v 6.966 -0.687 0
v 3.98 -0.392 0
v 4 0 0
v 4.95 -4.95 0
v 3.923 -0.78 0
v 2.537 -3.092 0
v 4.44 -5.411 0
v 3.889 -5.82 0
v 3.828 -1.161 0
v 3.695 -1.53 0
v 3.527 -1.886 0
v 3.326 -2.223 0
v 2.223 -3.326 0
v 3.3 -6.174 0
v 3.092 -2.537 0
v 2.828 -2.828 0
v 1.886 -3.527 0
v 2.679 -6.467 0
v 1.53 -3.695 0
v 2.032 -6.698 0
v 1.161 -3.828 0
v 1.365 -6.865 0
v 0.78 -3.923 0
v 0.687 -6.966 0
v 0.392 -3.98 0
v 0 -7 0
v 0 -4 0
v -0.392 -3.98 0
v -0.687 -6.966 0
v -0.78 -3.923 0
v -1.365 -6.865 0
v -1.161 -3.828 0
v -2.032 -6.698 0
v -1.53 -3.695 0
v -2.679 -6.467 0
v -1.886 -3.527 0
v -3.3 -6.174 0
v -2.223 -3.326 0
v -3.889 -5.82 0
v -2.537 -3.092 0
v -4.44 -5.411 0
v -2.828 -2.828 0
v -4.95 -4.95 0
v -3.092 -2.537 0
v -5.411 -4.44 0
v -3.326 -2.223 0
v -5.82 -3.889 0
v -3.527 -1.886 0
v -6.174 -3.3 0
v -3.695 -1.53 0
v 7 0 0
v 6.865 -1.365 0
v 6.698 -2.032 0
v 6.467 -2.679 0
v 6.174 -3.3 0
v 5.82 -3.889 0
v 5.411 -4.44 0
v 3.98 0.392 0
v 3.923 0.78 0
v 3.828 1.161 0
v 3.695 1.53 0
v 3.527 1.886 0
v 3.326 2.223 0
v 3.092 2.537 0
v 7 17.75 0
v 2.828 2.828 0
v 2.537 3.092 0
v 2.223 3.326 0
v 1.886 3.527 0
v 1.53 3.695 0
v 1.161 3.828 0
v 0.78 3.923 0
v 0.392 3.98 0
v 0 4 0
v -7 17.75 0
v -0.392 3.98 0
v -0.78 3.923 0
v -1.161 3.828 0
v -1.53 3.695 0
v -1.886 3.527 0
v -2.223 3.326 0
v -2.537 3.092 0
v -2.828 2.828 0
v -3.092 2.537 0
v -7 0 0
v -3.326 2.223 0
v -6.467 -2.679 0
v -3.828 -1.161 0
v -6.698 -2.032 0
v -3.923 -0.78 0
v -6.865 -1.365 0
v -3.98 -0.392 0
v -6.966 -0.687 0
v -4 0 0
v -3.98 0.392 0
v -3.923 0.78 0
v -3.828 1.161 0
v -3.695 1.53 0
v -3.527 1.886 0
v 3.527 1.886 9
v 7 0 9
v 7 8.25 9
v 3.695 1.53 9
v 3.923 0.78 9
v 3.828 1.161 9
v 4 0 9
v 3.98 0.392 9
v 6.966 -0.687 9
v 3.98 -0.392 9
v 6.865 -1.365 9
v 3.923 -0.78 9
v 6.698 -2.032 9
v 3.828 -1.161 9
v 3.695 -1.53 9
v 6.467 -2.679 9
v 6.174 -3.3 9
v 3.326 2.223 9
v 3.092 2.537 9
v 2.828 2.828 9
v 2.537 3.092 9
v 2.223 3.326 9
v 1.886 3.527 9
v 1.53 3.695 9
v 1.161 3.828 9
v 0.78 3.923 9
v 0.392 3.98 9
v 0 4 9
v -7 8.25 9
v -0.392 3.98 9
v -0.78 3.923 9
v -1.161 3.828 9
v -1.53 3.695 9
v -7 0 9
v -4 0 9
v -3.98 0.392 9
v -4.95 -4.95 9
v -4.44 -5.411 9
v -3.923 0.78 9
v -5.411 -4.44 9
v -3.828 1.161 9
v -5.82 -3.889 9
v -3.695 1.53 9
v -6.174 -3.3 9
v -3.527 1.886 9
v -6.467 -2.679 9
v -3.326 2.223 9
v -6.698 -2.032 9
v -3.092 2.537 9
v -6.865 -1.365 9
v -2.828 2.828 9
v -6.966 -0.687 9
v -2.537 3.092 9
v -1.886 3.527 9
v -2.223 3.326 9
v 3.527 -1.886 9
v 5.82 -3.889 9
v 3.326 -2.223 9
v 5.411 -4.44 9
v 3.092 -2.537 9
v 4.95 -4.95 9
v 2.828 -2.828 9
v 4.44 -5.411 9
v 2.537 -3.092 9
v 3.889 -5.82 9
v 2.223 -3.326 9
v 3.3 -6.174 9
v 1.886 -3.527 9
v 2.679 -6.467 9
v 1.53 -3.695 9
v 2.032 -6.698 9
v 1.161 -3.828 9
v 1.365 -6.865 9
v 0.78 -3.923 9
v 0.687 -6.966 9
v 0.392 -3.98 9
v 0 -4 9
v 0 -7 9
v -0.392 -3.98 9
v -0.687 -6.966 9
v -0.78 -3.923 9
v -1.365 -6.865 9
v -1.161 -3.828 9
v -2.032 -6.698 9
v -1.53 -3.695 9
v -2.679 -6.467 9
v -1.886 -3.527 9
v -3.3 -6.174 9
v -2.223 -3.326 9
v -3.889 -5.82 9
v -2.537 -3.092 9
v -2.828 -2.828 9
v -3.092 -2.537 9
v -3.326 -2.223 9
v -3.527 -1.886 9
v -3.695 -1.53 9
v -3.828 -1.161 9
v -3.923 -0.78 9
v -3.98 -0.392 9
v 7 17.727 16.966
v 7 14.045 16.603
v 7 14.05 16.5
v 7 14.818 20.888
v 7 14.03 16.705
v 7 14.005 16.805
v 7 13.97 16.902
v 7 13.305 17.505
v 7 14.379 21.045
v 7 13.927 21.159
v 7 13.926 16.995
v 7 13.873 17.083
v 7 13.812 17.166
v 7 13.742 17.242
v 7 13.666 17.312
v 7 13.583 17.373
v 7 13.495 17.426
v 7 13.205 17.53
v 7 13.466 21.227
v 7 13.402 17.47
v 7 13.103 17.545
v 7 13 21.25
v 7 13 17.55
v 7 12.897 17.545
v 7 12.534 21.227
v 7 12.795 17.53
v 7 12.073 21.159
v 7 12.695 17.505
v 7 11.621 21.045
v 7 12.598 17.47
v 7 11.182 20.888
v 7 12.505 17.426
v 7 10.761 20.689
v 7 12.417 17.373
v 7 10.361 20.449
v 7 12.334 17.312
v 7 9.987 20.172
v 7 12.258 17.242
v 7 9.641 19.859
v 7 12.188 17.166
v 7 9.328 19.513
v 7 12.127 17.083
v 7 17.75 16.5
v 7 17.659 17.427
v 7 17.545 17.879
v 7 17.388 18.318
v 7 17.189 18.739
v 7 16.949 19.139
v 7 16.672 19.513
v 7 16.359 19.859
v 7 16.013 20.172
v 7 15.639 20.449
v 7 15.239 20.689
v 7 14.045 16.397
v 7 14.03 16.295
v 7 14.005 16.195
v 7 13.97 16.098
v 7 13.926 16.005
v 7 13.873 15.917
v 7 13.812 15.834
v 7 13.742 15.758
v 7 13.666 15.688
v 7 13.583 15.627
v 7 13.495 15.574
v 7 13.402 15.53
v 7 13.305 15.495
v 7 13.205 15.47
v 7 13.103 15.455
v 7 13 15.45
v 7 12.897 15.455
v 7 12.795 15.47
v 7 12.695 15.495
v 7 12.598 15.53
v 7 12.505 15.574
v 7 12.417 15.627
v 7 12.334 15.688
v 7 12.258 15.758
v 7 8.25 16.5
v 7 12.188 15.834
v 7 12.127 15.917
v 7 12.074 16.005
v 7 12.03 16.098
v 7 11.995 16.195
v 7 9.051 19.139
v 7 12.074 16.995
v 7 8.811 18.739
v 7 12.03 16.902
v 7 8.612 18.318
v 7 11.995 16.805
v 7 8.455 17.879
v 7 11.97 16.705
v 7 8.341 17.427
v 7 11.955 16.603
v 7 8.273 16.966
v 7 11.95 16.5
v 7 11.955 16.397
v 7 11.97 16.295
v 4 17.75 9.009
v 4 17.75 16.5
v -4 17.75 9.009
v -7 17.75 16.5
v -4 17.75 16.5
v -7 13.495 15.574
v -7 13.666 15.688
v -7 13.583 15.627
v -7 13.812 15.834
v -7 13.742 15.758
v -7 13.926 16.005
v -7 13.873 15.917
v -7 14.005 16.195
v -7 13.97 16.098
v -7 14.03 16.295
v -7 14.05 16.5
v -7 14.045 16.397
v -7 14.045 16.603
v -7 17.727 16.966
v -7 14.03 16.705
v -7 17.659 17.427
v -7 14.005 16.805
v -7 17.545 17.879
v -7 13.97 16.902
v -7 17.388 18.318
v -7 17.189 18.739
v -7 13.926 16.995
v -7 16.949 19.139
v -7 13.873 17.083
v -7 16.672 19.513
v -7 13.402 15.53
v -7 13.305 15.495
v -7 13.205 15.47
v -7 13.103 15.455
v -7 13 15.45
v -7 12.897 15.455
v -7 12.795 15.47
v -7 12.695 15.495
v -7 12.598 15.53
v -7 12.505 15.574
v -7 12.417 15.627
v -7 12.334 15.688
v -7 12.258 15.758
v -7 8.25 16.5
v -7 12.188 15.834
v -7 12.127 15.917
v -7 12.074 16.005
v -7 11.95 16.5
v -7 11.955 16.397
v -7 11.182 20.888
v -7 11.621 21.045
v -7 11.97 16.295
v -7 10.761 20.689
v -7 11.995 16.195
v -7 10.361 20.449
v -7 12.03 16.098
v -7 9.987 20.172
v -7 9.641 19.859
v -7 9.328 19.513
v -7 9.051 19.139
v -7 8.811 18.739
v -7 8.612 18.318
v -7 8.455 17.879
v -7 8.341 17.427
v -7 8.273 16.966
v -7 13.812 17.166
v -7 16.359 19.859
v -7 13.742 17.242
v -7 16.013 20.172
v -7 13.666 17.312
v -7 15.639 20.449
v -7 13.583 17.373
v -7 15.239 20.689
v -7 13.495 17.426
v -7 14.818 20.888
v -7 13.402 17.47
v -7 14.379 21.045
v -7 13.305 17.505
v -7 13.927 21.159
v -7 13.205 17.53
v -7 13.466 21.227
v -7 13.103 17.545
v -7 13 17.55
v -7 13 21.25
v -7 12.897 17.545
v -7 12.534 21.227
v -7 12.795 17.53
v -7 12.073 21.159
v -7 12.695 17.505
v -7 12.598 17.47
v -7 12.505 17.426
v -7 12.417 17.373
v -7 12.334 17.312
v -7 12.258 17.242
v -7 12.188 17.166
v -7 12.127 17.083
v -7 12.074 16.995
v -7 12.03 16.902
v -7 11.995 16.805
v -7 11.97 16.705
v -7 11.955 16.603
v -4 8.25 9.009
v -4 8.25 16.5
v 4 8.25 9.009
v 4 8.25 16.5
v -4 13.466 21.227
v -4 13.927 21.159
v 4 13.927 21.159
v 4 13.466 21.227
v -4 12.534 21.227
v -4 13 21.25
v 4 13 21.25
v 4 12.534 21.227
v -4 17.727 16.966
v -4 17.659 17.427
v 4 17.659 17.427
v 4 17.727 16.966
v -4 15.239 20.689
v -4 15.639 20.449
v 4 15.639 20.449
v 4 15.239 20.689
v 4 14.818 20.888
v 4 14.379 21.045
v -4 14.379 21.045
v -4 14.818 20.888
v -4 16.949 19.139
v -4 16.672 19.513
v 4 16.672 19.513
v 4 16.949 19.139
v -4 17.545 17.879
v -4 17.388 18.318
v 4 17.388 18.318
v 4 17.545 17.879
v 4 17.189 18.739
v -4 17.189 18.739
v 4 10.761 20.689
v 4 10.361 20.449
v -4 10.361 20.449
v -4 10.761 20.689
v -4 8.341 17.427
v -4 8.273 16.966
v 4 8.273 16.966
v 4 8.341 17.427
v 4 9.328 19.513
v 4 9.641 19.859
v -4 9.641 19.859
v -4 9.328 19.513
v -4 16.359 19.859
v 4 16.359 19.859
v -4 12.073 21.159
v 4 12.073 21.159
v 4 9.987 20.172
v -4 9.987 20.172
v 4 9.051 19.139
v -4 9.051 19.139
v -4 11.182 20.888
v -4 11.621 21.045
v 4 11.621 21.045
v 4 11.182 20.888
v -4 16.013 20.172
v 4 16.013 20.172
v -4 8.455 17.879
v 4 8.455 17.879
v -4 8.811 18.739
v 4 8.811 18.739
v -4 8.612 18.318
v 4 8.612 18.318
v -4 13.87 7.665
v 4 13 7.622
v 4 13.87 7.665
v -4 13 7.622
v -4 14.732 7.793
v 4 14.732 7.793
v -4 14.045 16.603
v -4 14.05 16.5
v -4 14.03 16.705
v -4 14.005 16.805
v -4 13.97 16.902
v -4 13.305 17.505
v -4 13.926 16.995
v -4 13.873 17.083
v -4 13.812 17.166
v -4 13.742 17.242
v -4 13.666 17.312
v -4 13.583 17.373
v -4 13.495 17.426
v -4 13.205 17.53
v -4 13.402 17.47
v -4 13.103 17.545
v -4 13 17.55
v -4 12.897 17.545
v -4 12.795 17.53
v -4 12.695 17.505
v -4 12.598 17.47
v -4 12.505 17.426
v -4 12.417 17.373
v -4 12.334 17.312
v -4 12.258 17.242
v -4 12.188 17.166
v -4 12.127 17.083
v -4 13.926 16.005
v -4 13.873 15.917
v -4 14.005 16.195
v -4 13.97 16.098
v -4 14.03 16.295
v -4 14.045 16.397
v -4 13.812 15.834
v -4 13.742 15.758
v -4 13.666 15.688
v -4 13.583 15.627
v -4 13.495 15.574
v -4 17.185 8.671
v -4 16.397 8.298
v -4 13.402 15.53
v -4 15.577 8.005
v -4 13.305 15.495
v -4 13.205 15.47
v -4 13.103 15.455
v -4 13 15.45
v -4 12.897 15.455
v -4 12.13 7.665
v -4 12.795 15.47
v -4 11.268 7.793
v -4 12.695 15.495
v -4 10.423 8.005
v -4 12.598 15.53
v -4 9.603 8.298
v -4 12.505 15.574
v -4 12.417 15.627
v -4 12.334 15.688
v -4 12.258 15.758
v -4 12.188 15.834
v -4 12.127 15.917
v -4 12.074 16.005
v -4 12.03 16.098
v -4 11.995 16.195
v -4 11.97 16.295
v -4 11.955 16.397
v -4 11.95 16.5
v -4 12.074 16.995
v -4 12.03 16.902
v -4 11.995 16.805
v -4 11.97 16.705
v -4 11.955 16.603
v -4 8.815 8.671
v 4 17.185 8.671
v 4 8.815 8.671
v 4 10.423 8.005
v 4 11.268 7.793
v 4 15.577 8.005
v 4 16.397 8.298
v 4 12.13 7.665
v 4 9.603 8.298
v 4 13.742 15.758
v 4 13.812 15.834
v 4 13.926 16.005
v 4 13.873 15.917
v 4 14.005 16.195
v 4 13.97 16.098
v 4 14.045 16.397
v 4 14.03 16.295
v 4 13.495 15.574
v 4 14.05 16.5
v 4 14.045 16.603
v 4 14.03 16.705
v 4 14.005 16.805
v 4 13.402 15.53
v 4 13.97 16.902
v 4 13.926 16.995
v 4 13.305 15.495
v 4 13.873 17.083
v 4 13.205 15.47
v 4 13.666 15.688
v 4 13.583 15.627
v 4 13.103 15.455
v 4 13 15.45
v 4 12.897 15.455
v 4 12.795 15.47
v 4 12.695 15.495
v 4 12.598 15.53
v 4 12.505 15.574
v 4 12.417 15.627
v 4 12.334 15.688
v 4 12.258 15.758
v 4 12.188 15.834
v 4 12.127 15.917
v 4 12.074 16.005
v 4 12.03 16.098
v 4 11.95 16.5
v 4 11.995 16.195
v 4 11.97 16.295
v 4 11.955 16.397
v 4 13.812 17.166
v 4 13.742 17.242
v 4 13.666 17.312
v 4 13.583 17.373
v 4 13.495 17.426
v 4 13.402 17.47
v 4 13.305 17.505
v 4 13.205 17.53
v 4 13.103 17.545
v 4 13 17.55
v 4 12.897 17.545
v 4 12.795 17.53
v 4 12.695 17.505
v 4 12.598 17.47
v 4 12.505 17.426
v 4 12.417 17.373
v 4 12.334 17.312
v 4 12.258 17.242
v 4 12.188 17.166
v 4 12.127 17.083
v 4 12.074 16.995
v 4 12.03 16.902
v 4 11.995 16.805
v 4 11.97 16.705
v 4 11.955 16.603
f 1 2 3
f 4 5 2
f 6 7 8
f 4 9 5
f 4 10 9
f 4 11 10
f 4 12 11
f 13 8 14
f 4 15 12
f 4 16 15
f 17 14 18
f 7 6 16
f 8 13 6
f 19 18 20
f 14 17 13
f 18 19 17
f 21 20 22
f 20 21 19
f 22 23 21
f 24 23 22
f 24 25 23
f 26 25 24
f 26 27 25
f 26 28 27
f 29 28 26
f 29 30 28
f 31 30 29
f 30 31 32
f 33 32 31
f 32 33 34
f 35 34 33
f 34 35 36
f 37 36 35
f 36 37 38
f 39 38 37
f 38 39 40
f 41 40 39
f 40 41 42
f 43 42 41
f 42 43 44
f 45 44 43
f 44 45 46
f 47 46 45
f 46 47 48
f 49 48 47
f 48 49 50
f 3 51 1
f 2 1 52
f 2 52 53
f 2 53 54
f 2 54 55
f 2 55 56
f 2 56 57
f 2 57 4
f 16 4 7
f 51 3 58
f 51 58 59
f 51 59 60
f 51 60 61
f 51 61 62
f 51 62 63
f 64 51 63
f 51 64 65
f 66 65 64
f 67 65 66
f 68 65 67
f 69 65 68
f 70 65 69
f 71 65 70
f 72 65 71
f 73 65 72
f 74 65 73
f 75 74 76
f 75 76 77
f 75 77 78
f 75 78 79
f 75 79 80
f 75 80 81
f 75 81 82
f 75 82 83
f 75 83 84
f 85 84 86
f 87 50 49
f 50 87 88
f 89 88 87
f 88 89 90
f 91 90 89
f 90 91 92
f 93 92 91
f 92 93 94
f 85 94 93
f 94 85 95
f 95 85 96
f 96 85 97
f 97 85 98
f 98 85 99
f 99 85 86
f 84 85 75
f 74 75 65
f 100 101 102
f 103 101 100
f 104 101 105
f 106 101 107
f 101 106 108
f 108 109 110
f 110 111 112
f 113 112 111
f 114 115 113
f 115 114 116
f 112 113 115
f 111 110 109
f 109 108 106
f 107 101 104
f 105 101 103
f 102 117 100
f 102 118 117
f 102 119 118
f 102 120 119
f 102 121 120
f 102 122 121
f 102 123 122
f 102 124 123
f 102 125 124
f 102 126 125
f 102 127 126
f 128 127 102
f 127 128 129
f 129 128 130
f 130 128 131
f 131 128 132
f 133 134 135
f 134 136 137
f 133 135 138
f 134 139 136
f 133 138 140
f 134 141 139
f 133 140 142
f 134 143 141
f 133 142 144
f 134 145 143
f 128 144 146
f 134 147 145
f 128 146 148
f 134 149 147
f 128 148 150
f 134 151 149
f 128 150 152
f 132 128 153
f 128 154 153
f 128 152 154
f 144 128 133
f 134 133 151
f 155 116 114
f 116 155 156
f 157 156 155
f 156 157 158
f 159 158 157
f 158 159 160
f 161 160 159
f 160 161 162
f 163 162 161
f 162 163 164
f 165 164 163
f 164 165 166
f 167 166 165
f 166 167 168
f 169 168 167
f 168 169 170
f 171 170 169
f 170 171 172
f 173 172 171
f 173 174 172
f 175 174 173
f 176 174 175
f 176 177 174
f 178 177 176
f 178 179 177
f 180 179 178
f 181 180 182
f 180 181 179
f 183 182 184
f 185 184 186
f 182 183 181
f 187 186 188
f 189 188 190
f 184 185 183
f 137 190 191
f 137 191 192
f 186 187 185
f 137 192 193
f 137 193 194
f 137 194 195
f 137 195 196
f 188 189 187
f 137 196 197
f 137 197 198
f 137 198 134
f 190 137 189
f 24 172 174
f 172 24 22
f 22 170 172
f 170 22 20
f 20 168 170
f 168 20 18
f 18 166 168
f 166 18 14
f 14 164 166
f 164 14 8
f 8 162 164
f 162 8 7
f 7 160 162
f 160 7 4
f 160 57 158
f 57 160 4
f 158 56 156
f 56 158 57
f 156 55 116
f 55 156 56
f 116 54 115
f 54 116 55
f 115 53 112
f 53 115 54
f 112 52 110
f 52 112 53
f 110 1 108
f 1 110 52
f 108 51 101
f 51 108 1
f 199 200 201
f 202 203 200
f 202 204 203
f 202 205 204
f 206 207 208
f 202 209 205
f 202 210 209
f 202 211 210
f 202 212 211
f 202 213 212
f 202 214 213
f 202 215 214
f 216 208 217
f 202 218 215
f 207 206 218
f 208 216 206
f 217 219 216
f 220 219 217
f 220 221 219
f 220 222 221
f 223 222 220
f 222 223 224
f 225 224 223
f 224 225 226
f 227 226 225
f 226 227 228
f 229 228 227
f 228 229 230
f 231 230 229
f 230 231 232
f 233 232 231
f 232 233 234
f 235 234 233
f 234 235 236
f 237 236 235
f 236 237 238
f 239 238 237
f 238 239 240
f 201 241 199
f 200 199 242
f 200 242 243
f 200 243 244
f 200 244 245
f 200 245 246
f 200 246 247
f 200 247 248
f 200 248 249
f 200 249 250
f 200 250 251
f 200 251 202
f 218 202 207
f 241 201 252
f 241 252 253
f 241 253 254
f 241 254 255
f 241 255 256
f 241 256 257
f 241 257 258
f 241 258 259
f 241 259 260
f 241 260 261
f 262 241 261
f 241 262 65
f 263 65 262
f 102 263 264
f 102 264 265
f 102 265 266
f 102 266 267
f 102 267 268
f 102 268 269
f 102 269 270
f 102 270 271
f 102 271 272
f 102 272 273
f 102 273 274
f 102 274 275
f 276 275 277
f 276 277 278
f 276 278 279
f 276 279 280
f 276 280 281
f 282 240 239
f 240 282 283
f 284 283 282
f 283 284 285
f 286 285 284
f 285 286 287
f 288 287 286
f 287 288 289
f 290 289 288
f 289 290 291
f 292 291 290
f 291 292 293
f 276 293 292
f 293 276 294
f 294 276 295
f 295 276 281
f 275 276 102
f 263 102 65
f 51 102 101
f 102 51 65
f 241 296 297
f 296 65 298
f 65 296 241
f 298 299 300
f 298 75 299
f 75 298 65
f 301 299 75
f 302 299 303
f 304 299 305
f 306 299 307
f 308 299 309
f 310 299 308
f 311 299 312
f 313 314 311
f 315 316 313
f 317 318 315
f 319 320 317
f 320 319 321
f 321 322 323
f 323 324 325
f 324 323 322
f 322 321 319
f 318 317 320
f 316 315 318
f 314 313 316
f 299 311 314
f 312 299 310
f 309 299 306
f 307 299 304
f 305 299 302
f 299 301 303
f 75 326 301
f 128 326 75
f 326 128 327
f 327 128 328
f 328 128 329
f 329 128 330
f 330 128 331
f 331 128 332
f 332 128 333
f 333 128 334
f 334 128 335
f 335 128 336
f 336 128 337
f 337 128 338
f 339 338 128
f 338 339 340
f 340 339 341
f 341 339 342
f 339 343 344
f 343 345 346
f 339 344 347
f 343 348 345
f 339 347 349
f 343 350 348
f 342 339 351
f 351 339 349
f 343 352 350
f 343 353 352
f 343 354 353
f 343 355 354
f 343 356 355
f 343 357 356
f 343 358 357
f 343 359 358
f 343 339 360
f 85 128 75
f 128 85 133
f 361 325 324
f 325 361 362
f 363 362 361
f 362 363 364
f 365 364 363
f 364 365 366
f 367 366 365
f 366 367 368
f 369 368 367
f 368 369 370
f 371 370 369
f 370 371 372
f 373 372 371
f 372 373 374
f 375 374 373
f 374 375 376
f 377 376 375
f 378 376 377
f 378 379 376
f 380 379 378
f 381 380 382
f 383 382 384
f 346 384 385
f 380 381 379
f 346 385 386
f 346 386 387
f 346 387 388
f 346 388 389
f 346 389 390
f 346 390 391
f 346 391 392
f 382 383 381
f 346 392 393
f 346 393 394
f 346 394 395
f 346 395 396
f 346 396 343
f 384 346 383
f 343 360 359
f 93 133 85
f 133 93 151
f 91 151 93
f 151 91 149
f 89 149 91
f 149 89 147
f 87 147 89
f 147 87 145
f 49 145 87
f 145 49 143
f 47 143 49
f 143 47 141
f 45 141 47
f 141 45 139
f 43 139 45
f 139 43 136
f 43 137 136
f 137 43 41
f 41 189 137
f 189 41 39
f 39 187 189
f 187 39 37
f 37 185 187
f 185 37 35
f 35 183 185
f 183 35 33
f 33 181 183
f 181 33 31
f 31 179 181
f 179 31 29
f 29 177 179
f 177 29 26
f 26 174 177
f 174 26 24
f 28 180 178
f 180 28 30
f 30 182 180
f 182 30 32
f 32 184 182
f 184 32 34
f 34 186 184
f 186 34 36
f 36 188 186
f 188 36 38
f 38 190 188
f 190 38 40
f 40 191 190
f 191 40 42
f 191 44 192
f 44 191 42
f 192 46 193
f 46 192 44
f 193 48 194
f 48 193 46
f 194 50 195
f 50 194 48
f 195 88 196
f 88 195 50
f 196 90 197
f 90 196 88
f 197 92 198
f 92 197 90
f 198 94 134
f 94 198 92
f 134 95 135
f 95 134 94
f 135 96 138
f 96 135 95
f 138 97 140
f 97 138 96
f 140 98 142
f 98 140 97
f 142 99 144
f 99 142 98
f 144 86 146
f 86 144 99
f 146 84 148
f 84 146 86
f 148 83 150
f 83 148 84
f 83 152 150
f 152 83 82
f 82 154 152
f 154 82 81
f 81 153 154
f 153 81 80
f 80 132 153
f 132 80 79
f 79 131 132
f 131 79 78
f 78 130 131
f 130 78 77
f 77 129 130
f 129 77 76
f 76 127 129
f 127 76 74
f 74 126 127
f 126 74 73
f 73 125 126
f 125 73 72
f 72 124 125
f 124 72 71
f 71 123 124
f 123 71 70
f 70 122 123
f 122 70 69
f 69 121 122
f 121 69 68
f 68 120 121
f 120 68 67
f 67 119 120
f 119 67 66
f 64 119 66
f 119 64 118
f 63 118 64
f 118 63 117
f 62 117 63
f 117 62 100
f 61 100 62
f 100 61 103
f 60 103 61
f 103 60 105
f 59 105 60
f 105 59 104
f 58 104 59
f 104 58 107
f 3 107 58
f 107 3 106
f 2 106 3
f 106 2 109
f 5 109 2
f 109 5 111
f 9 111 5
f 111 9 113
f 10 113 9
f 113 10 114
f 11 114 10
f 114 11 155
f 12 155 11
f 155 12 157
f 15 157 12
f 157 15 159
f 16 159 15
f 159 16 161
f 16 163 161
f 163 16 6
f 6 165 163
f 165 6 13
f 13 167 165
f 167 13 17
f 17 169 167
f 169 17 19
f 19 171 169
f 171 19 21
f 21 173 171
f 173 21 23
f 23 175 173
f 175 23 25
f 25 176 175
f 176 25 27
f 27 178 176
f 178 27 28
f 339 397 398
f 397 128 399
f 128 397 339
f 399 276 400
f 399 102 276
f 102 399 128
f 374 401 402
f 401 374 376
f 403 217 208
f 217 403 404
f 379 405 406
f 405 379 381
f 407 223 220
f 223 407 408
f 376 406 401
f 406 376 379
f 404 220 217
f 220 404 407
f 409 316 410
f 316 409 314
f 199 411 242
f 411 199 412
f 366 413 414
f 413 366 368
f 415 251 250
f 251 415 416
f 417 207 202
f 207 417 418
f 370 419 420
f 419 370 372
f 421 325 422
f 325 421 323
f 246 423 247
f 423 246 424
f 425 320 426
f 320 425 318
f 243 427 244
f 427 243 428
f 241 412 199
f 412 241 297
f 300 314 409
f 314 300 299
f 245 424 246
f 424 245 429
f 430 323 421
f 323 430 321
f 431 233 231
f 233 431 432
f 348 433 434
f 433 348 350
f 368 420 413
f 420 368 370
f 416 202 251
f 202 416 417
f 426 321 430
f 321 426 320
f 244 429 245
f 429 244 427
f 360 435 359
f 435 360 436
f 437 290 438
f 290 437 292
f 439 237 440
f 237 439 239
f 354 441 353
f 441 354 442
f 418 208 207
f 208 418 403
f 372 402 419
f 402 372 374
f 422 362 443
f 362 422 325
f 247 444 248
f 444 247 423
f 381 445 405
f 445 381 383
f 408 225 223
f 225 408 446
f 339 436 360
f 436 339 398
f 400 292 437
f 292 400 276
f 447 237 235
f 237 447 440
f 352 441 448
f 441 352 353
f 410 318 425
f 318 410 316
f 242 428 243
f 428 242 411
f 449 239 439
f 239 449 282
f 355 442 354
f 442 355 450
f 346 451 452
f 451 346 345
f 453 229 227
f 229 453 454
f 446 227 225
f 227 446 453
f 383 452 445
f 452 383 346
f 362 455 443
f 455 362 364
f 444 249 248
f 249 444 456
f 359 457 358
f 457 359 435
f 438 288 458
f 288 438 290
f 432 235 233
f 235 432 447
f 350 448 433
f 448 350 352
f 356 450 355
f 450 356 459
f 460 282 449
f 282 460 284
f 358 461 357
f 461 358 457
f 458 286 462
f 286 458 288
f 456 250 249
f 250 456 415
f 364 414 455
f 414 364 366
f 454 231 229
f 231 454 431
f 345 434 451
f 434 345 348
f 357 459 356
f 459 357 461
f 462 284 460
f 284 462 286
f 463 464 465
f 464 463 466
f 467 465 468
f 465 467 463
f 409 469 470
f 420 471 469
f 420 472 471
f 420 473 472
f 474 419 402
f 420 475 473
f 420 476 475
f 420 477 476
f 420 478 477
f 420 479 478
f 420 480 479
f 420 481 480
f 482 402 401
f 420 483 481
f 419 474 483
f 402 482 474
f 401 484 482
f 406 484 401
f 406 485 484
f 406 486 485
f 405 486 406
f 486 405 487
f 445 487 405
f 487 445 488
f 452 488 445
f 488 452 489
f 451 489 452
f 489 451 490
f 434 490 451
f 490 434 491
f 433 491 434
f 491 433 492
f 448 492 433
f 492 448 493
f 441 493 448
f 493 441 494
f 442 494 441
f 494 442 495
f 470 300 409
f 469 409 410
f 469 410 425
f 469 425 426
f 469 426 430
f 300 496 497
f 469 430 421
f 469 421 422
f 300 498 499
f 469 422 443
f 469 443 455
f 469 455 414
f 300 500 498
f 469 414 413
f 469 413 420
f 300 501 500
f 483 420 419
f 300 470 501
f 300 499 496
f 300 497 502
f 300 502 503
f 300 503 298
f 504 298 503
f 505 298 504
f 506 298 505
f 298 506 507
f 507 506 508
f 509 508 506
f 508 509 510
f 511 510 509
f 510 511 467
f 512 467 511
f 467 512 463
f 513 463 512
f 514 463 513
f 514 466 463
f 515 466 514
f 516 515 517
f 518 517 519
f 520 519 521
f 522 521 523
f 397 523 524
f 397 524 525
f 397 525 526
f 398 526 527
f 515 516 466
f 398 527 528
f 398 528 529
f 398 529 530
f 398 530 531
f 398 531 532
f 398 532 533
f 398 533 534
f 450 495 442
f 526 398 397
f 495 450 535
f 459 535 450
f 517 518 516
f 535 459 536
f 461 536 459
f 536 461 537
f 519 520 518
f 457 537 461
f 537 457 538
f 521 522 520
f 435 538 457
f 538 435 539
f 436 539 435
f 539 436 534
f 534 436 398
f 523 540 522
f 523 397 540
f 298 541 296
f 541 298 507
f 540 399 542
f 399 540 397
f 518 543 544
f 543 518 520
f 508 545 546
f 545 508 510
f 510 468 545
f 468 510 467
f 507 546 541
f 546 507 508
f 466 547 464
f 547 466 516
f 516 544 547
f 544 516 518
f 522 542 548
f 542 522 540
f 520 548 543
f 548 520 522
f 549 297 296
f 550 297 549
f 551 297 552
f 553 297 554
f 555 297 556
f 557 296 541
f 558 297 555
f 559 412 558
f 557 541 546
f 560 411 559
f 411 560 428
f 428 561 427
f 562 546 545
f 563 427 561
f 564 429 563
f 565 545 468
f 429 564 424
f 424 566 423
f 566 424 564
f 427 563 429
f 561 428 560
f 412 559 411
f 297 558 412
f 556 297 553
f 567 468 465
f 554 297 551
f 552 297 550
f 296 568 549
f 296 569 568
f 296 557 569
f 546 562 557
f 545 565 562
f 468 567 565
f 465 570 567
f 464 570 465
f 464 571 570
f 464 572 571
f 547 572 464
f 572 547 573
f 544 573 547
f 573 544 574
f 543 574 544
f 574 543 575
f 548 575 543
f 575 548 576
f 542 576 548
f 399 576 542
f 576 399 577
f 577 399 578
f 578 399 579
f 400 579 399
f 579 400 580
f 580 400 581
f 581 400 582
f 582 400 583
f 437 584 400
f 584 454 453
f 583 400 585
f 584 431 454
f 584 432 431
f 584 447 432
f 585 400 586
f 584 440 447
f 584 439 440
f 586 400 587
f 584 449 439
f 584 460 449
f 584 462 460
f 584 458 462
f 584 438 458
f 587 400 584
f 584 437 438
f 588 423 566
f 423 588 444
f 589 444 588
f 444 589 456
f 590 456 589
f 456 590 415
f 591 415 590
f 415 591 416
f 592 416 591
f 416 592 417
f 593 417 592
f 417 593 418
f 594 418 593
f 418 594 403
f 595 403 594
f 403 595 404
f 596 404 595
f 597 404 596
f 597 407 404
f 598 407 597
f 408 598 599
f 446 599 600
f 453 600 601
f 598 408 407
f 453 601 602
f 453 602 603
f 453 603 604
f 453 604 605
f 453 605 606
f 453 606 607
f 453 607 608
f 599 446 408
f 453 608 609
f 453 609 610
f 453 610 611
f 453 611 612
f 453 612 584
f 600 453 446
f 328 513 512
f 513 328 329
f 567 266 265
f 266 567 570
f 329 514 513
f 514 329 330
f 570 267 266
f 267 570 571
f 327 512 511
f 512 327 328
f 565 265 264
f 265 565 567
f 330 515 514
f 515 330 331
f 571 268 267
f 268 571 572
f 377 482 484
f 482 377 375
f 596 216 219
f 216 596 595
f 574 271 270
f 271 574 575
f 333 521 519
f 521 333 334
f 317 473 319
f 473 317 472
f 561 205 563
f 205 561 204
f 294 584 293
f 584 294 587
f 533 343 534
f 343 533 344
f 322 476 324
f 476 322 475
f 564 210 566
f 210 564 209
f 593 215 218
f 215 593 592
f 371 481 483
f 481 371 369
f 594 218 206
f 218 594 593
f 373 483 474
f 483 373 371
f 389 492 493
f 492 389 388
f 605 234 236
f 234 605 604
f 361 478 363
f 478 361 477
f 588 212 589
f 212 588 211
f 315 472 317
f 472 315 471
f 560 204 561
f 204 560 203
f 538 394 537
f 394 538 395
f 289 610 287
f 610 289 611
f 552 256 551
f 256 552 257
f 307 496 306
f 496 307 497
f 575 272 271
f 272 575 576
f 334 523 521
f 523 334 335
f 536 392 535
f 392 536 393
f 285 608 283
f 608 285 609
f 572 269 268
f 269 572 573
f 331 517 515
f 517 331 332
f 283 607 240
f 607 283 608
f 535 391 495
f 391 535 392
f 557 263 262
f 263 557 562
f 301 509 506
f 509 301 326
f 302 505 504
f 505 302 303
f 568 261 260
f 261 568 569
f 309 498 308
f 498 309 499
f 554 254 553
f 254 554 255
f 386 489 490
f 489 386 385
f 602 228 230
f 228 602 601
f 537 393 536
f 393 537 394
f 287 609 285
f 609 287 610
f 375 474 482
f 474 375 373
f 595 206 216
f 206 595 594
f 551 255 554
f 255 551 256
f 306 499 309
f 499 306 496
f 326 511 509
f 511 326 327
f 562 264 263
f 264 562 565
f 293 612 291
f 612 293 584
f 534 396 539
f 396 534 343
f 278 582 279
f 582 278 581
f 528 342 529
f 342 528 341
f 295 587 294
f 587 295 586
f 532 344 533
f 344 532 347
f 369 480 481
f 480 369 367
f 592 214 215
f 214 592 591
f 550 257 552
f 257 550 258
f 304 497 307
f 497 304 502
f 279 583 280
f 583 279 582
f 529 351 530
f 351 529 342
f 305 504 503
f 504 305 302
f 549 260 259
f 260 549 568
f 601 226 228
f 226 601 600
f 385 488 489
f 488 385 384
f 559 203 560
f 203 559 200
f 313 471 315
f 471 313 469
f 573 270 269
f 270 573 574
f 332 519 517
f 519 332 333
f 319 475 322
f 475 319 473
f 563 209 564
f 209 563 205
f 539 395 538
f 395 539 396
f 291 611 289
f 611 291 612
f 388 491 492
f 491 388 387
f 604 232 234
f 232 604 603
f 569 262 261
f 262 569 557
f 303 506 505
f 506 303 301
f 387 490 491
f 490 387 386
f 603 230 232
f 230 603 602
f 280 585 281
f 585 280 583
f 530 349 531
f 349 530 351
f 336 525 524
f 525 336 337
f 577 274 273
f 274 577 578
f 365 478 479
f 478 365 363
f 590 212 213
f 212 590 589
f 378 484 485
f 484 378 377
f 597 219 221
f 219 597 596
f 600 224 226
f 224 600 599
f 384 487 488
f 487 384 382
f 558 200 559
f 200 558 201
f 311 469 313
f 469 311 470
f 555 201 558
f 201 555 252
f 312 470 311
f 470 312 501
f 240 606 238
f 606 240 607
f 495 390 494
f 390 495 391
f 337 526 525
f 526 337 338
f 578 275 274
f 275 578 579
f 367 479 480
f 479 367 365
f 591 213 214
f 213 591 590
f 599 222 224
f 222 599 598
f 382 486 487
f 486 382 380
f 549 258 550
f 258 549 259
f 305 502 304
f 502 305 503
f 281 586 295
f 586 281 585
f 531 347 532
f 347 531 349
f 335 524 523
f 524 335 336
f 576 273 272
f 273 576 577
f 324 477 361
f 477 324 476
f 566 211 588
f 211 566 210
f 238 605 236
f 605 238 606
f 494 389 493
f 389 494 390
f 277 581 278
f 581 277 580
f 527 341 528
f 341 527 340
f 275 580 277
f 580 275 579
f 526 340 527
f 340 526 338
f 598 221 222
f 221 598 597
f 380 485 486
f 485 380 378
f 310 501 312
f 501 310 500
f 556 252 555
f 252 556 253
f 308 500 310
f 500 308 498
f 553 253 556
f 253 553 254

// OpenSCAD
// file: defs.scad
DRAWINGS_DIR = ".";
FN = 64;
SCREW_RADIUS = 1.1;
BASE_THICKNESS = 2;
SENSOR_RADIUS = 8.5;
SENSOR_OFFSET_Y = 13.5;
SENSOR_CENTER_OFFSET = 71.6395;
// main file
include <defs.scad>;

DXF_FILE = str(DRAWINGS_DIR, "/wheel-support.dxf");
LOW_HEIGHT = 9;
LOW_LAYER = "openscad_low";
HIGH_HEIGHT = 16.5;
HIGH_LAYER = "openscad_high";
AXIS_LENGTH = 14;
AXIS_RADIUS = 4.75;
AXIS_POS = [0, 13, HIGH_HEIGHT];
BIG_HOLE_LENGTH = 8;
BIG_HOLE_RADIUS = sqrt(pow(AXIS_RADIUS, 2) + pow(HIGH_HEIGHT - LOW_HEIGHT, 2));
SMALL_HOLE_LENGTH = AXIS_LENGTH + 2;
SMALL_HOLE_RADIUS = 1.05;

difference() {
	union() {
		linear_extrude(height = LOW_HEIGHT) {
			import(file = DXF_FILE, layer = LOW_LAYER, $fn=FN);
		}
		linear_extrude(height = HIGH_HEIGHT) {
			import(file = DXF_FILE, layer = HIGH_LAYER, $fn=FN);
		}
		translate(AXIS_POS) {
			rotate(90, [0, 1, 0]) {
				cylinder(AXIS_LENGTH, AXIS_RADIUS, AXIS_RADIUS, center=true, $fn=FN);
			}
		}
	}
	translate(AXIS_POS) {
		rotate(90, [0, 1, 0]) {
			cylinder(BIG_HOLE_LENGTH, BIG_HOLE_RADIUS, BIG_HOLE_RADIUS, center=true, $fn=FN);
			cylinder(SMALL_HOLE_LENGTH, SMALL_HOLE_RADIUS, SMALL_HOLE_RADIUS, center=true, $fn=FN);
		}
	}
}
